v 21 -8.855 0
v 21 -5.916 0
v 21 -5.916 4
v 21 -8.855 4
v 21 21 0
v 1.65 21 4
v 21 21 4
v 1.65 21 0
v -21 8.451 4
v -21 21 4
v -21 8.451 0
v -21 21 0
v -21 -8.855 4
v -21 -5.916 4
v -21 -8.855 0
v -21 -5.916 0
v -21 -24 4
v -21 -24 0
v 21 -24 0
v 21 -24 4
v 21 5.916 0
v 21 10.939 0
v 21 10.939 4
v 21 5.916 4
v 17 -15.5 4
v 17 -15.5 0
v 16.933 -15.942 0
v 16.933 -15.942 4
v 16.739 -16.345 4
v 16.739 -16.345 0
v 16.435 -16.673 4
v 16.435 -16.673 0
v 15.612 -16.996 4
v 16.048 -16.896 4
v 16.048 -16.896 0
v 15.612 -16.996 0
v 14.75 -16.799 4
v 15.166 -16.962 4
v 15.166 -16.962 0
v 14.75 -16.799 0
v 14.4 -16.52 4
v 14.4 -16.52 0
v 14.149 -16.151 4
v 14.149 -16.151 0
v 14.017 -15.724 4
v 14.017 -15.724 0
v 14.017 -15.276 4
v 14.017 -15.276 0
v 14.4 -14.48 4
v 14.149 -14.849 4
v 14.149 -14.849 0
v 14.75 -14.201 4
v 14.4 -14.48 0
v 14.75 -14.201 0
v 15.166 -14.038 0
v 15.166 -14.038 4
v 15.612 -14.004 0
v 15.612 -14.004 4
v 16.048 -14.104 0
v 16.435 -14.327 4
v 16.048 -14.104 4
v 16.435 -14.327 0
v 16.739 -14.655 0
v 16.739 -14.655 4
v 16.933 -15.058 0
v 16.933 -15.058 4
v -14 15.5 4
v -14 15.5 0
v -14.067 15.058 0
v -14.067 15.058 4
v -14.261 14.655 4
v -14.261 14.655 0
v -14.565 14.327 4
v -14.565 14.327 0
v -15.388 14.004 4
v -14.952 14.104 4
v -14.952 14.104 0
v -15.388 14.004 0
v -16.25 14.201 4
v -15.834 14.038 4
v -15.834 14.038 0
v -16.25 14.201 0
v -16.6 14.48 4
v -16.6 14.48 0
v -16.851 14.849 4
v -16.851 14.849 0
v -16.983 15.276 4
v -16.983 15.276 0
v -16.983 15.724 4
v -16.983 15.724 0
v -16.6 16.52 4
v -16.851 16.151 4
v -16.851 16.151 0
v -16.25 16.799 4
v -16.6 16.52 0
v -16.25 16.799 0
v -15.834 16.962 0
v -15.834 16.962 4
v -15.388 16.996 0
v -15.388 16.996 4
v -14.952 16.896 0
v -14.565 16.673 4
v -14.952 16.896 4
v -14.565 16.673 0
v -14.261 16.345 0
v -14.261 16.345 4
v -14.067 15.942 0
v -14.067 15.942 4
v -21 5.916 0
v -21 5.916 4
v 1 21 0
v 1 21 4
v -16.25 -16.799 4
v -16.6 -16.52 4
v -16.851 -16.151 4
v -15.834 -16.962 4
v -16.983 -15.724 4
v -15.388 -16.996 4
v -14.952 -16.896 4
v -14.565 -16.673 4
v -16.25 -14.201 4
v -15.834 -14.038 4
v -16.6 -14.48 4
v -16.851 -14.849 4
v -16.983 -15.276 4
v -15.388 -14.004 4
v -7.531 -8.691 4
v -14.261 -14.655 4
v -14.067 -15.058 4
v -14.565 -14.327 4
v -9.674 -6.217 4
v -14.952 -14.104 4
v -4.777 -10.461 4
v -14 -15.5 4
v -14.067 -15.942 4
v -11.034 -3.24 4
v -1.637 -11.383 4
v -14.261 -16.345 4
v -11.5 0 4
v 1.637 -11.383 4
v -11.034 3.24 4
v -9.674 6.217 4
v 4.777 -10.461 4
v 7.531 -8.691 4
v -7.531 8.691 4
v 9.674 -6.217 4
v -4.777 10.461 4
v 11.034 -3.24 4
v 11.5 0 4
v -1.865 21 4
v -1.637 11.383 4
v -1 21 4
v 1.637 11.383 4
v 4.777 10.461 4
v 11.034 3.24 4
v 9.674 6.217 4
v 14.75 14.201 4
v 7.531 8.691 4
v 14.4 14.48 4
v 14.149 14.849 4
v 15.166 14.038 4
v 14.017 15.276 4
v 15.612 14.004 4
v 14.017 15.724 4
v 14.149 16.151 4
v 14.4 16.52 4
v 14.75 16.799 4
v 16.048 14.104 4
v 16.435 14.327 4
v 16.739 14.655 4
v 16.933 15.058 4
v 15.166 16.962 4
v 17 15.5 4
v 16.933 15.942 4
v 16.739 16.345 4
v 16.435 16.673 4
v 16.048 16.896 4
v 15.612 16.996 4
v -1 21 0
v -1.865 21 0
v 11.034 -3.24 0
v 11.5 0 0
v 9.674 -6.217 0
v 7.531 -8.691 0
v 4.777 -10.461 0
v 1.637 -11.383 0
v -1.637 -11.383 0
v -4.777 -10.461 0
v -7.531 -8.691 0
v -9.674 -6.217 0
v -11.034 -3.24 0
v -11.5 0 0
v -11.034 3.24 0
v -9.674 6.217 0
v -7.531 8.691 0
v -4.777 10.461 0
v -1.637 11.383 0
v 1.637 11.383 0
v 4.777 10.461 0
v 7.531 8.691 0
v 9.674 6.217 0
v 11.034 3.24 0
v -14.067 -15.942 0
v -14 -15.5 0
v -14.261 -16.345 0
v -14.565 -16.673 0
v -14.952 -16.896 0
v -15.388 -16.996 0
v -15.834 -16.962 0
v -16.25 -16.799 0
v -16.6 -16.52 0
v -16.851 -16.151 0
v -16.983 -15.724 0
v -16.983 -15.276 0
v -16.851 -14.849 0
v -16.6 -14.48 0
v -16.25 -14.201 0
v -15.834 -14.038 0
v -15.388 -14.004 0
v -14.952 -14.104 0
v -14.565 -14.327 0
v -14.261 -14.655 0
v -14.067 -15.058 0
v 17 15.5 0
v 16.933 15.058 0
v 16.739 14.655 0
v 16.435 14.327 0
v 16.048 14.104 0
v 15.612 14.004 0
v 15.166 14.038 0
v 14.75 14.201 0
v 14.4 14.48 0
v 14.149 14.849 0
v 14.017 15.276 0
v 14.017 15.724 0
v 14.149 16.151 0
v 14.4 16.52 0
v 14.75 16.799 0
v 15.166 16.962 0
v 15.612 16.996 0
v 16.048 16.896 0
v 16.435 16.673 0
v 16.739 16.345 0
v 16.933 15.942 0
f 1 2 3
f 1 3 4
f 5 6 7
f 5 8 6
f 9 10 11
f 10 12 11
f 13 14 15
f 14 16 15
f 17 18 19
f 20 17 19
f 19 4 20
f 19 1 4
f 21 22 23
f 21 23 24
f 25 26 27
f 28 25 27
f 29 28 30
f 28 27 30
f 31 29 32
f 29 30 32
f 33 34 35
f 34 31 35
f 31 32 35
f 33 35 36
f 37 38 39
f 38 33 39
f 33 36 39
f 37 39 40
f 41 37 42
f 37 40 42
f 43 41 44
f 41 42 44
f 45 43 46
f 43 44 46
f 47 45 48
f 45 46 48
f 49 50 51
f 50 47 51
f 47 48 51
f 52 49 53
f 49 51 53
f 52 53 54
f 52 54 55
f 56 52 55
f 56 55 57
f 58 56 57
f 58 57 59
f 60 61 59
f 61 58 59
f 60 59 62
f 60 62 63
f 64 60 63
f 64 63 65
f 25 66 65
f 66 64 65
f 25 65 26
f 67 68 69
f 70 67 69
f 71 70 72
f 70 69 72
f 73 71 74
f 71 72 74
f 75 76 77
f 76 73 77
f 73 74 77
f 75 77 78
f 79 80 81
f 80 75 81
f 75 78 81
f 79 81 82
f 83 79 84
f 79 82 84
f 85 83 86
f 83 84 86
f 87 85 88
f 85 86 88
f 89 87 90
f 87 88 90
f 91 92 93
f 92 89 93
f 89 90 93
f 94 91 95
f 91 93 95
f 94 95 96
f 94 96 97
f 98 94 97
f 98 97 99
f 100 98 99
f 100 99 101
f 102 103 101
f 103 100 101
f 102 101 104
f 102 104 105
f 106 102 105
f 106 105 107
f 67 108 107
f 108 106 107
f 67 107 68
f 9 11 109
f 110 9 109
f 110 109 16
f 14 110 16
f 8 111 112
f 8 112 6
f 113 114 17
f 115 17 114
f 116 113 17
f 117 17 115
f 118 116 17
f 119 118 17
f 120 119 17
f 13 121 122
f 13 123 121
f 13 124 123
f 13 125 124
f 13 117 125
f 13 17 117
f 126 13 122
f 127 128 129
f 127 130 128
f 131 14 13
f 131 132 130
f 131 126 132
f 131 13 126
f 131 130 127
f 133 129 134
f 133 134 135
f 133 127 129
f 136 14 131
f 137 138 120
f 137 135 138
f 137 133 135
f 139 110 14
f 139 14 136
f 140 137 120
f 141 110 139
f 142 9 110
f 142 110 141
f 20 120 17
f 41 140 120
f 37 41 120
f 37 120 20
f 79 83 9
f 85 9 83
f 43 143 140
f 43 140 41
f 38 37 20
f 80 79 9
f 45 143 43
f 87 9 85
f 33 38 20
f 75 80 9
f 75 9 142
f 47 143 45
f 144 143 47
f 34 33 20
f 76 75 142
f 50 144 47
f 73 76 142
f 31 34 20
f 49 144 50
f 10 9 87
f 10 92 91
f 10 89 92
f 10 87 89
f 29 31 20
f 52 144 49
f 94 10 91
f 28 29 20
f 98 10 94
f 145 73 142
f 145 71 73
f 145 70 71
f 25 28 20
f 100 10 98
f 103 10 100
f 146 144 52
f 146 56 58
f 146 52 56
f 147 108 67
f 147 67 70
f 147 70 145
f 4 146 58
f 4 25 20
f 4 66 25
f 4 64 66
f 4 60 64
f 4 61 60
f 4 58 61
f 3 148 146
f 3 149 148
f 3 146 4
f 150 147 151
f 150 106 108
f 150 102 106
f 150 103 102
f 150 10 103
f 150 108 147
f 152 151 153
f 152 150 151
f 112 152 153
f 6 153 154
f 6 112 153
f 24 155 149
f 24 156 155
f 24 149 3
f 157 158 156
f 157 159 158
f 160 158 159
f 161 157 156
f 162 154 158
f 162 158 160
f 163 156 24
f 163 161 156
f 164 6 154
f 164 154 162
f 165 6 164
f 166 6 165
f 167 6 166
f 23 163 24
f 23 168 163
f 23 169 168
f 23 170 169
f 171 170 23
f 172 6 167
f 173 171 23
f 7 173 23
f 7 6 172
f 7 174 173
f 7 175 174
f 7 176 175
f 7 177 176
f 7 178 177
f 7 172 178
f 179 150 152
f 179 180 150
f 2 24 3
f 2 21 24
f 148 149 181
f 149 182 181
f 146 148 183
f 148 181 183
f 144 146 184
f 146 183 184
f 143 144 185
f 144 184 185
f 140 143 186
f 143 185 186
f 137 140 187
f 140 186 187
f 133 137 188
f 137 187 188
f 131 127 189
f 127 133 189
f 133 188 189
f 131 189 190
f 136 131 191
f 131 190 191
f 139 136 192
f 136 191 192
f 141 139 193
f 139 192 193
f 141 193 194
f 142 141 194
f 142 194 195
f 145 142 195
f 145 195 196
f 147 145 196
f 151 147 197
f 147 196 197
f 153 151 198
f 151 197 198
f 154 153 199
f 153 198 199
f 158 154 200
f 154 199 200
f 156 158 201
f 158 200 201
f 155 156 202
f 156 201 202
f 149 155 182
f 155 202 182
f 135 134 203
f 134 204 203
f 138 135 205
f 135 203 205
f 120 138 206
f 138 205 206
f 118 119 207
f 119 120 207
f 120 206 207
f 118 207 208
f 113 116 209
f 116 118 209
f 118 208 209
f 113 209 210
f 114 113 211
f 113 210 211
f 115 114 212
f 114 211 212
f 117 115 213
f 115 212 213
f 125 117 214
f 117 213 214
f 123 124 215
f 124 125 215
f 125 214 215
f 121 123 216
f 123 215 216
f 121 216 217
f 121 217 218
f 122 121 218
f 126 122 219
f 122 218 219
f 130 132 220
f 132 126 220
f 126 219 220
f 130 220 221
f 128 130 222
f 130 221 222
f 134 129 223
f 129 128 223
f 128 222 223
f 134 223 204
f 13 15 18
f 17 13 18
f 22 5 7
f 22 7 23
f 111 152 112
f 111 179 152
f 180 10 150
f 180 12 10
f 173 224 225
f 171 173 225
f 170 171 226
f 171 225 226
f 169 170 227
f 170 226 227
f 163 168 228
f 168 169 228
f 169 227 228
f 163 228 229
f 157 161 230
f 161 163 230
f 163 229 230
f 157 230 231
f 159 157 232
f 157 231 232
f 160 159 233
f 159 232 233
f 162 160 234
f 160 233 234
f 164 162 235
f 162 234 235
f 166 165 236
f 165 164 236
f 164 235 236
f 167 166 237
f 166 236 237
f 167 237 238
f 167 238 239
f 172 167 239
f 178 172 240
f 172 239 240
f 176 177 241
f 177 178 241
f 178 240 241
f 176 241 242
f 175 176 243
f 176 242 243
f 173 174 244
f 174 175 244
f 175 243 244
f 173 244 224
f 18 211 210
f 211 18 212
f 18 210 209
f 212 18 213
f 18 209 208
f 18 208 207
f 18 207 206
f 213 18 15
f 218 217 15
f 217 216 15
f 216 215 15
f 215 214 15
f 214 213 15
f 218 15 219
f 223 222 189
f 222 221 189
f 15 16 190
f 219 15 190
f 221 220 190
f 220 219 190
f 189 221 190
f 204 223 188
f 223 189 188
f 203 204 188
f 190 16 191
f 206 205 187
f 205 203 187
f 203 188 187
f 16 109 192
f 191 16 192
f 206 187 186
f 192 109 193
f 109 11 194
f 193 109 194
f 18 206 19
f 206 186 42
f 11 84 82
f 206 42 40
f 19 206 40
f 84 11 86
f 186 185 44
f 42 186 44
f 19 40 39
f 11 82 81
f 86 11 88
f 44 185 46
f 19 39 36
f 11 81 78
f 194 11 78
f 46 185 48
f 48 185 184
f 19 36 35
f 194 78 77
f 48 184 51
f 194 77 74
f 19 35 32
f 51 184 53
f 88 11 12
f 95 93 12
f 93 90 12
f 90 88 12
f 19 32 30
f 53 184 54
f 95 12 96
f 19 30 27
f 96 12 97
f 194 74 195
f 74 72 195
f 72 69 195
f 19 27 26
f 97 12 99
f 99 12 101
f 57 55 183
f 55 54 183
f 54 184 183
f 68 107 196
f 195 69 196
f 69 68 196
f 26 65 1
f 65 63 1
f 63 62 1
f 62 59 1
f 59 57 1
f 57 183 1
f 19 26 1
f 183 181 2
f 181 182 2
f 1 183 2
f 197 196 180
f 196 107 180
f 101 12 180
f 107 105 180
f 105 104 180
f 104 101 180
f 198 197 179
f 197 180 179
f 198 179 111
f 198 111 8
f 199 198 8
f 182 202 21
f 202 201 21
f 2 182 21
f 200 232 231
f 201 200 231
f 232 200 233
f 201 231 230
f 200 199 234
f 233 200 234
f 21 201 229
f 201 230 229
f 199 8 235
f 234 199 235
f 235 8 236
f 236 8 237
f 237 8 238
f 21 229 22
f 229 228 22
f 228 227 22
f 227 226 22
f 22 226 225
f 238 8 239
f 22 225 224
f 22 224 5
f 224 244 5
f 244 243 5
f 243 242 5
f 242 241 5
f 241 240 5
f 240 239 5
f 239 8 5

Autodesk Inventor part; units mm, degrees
ref_plane "YZ Plane" through (0, 0, 0) normal (1, 0, 0) x (0, 1, 0)
ref_plane "XZ Plane" through (0, 0, 0) normal (0, 1, 0) x (-1, 0, 0)
ref_plane "XY Plane" through (0, 0, 0) normal (0, 0, 1) x (1, 0, 0)
sketch "Sketch1" plane through (0, 0, 0) normal (0, 0, 1) x (1, 0, 0)
  circle A0 centre (0, 0) radius 11.5
  circle A1 centre (-15.5, 15.5) radius 1.5
  circle A2 centre (-15.5, -15.5) radius 1.5
  circle A3 centre (15.5, 15.5) radius 1.5
  circle A4 centre (15.5, -15.5) radius 1.5
  line L0 (-21, -24) -> (21, -24)
  line L1 (0, 20) -> (4.5462, 20) construction
  line L2 (-21, 21) -> (-1, 21)
  line L3 (1, 21) -> (21, 21)
  line L4 (-21, 21) -> (-21, 5.9161)
  line L5 (-21, -5.9161) -> (-21, -24)
  line L6 (21, 21) -> (21, 5.9161)
  line L7 (21, -5.9161) -> (21, -24)
  line L8 (-1.865, 21) -> (1.6498, 21)
  line L9 (-21, 8.451) -> (-21, -8.8551)
  line L10 (21, 10.9387) -> (21, -8.8551)
  dimension "d0" = 23
  dimension "d1" = 3
  dimension "d2" = 3
  dimension "d3" = 24
  dimension "d4" = 8.5
extrude "Extrusion1" add sketch "Sketch1" along normal blind 4
properties part number "StepperHolderTop"
